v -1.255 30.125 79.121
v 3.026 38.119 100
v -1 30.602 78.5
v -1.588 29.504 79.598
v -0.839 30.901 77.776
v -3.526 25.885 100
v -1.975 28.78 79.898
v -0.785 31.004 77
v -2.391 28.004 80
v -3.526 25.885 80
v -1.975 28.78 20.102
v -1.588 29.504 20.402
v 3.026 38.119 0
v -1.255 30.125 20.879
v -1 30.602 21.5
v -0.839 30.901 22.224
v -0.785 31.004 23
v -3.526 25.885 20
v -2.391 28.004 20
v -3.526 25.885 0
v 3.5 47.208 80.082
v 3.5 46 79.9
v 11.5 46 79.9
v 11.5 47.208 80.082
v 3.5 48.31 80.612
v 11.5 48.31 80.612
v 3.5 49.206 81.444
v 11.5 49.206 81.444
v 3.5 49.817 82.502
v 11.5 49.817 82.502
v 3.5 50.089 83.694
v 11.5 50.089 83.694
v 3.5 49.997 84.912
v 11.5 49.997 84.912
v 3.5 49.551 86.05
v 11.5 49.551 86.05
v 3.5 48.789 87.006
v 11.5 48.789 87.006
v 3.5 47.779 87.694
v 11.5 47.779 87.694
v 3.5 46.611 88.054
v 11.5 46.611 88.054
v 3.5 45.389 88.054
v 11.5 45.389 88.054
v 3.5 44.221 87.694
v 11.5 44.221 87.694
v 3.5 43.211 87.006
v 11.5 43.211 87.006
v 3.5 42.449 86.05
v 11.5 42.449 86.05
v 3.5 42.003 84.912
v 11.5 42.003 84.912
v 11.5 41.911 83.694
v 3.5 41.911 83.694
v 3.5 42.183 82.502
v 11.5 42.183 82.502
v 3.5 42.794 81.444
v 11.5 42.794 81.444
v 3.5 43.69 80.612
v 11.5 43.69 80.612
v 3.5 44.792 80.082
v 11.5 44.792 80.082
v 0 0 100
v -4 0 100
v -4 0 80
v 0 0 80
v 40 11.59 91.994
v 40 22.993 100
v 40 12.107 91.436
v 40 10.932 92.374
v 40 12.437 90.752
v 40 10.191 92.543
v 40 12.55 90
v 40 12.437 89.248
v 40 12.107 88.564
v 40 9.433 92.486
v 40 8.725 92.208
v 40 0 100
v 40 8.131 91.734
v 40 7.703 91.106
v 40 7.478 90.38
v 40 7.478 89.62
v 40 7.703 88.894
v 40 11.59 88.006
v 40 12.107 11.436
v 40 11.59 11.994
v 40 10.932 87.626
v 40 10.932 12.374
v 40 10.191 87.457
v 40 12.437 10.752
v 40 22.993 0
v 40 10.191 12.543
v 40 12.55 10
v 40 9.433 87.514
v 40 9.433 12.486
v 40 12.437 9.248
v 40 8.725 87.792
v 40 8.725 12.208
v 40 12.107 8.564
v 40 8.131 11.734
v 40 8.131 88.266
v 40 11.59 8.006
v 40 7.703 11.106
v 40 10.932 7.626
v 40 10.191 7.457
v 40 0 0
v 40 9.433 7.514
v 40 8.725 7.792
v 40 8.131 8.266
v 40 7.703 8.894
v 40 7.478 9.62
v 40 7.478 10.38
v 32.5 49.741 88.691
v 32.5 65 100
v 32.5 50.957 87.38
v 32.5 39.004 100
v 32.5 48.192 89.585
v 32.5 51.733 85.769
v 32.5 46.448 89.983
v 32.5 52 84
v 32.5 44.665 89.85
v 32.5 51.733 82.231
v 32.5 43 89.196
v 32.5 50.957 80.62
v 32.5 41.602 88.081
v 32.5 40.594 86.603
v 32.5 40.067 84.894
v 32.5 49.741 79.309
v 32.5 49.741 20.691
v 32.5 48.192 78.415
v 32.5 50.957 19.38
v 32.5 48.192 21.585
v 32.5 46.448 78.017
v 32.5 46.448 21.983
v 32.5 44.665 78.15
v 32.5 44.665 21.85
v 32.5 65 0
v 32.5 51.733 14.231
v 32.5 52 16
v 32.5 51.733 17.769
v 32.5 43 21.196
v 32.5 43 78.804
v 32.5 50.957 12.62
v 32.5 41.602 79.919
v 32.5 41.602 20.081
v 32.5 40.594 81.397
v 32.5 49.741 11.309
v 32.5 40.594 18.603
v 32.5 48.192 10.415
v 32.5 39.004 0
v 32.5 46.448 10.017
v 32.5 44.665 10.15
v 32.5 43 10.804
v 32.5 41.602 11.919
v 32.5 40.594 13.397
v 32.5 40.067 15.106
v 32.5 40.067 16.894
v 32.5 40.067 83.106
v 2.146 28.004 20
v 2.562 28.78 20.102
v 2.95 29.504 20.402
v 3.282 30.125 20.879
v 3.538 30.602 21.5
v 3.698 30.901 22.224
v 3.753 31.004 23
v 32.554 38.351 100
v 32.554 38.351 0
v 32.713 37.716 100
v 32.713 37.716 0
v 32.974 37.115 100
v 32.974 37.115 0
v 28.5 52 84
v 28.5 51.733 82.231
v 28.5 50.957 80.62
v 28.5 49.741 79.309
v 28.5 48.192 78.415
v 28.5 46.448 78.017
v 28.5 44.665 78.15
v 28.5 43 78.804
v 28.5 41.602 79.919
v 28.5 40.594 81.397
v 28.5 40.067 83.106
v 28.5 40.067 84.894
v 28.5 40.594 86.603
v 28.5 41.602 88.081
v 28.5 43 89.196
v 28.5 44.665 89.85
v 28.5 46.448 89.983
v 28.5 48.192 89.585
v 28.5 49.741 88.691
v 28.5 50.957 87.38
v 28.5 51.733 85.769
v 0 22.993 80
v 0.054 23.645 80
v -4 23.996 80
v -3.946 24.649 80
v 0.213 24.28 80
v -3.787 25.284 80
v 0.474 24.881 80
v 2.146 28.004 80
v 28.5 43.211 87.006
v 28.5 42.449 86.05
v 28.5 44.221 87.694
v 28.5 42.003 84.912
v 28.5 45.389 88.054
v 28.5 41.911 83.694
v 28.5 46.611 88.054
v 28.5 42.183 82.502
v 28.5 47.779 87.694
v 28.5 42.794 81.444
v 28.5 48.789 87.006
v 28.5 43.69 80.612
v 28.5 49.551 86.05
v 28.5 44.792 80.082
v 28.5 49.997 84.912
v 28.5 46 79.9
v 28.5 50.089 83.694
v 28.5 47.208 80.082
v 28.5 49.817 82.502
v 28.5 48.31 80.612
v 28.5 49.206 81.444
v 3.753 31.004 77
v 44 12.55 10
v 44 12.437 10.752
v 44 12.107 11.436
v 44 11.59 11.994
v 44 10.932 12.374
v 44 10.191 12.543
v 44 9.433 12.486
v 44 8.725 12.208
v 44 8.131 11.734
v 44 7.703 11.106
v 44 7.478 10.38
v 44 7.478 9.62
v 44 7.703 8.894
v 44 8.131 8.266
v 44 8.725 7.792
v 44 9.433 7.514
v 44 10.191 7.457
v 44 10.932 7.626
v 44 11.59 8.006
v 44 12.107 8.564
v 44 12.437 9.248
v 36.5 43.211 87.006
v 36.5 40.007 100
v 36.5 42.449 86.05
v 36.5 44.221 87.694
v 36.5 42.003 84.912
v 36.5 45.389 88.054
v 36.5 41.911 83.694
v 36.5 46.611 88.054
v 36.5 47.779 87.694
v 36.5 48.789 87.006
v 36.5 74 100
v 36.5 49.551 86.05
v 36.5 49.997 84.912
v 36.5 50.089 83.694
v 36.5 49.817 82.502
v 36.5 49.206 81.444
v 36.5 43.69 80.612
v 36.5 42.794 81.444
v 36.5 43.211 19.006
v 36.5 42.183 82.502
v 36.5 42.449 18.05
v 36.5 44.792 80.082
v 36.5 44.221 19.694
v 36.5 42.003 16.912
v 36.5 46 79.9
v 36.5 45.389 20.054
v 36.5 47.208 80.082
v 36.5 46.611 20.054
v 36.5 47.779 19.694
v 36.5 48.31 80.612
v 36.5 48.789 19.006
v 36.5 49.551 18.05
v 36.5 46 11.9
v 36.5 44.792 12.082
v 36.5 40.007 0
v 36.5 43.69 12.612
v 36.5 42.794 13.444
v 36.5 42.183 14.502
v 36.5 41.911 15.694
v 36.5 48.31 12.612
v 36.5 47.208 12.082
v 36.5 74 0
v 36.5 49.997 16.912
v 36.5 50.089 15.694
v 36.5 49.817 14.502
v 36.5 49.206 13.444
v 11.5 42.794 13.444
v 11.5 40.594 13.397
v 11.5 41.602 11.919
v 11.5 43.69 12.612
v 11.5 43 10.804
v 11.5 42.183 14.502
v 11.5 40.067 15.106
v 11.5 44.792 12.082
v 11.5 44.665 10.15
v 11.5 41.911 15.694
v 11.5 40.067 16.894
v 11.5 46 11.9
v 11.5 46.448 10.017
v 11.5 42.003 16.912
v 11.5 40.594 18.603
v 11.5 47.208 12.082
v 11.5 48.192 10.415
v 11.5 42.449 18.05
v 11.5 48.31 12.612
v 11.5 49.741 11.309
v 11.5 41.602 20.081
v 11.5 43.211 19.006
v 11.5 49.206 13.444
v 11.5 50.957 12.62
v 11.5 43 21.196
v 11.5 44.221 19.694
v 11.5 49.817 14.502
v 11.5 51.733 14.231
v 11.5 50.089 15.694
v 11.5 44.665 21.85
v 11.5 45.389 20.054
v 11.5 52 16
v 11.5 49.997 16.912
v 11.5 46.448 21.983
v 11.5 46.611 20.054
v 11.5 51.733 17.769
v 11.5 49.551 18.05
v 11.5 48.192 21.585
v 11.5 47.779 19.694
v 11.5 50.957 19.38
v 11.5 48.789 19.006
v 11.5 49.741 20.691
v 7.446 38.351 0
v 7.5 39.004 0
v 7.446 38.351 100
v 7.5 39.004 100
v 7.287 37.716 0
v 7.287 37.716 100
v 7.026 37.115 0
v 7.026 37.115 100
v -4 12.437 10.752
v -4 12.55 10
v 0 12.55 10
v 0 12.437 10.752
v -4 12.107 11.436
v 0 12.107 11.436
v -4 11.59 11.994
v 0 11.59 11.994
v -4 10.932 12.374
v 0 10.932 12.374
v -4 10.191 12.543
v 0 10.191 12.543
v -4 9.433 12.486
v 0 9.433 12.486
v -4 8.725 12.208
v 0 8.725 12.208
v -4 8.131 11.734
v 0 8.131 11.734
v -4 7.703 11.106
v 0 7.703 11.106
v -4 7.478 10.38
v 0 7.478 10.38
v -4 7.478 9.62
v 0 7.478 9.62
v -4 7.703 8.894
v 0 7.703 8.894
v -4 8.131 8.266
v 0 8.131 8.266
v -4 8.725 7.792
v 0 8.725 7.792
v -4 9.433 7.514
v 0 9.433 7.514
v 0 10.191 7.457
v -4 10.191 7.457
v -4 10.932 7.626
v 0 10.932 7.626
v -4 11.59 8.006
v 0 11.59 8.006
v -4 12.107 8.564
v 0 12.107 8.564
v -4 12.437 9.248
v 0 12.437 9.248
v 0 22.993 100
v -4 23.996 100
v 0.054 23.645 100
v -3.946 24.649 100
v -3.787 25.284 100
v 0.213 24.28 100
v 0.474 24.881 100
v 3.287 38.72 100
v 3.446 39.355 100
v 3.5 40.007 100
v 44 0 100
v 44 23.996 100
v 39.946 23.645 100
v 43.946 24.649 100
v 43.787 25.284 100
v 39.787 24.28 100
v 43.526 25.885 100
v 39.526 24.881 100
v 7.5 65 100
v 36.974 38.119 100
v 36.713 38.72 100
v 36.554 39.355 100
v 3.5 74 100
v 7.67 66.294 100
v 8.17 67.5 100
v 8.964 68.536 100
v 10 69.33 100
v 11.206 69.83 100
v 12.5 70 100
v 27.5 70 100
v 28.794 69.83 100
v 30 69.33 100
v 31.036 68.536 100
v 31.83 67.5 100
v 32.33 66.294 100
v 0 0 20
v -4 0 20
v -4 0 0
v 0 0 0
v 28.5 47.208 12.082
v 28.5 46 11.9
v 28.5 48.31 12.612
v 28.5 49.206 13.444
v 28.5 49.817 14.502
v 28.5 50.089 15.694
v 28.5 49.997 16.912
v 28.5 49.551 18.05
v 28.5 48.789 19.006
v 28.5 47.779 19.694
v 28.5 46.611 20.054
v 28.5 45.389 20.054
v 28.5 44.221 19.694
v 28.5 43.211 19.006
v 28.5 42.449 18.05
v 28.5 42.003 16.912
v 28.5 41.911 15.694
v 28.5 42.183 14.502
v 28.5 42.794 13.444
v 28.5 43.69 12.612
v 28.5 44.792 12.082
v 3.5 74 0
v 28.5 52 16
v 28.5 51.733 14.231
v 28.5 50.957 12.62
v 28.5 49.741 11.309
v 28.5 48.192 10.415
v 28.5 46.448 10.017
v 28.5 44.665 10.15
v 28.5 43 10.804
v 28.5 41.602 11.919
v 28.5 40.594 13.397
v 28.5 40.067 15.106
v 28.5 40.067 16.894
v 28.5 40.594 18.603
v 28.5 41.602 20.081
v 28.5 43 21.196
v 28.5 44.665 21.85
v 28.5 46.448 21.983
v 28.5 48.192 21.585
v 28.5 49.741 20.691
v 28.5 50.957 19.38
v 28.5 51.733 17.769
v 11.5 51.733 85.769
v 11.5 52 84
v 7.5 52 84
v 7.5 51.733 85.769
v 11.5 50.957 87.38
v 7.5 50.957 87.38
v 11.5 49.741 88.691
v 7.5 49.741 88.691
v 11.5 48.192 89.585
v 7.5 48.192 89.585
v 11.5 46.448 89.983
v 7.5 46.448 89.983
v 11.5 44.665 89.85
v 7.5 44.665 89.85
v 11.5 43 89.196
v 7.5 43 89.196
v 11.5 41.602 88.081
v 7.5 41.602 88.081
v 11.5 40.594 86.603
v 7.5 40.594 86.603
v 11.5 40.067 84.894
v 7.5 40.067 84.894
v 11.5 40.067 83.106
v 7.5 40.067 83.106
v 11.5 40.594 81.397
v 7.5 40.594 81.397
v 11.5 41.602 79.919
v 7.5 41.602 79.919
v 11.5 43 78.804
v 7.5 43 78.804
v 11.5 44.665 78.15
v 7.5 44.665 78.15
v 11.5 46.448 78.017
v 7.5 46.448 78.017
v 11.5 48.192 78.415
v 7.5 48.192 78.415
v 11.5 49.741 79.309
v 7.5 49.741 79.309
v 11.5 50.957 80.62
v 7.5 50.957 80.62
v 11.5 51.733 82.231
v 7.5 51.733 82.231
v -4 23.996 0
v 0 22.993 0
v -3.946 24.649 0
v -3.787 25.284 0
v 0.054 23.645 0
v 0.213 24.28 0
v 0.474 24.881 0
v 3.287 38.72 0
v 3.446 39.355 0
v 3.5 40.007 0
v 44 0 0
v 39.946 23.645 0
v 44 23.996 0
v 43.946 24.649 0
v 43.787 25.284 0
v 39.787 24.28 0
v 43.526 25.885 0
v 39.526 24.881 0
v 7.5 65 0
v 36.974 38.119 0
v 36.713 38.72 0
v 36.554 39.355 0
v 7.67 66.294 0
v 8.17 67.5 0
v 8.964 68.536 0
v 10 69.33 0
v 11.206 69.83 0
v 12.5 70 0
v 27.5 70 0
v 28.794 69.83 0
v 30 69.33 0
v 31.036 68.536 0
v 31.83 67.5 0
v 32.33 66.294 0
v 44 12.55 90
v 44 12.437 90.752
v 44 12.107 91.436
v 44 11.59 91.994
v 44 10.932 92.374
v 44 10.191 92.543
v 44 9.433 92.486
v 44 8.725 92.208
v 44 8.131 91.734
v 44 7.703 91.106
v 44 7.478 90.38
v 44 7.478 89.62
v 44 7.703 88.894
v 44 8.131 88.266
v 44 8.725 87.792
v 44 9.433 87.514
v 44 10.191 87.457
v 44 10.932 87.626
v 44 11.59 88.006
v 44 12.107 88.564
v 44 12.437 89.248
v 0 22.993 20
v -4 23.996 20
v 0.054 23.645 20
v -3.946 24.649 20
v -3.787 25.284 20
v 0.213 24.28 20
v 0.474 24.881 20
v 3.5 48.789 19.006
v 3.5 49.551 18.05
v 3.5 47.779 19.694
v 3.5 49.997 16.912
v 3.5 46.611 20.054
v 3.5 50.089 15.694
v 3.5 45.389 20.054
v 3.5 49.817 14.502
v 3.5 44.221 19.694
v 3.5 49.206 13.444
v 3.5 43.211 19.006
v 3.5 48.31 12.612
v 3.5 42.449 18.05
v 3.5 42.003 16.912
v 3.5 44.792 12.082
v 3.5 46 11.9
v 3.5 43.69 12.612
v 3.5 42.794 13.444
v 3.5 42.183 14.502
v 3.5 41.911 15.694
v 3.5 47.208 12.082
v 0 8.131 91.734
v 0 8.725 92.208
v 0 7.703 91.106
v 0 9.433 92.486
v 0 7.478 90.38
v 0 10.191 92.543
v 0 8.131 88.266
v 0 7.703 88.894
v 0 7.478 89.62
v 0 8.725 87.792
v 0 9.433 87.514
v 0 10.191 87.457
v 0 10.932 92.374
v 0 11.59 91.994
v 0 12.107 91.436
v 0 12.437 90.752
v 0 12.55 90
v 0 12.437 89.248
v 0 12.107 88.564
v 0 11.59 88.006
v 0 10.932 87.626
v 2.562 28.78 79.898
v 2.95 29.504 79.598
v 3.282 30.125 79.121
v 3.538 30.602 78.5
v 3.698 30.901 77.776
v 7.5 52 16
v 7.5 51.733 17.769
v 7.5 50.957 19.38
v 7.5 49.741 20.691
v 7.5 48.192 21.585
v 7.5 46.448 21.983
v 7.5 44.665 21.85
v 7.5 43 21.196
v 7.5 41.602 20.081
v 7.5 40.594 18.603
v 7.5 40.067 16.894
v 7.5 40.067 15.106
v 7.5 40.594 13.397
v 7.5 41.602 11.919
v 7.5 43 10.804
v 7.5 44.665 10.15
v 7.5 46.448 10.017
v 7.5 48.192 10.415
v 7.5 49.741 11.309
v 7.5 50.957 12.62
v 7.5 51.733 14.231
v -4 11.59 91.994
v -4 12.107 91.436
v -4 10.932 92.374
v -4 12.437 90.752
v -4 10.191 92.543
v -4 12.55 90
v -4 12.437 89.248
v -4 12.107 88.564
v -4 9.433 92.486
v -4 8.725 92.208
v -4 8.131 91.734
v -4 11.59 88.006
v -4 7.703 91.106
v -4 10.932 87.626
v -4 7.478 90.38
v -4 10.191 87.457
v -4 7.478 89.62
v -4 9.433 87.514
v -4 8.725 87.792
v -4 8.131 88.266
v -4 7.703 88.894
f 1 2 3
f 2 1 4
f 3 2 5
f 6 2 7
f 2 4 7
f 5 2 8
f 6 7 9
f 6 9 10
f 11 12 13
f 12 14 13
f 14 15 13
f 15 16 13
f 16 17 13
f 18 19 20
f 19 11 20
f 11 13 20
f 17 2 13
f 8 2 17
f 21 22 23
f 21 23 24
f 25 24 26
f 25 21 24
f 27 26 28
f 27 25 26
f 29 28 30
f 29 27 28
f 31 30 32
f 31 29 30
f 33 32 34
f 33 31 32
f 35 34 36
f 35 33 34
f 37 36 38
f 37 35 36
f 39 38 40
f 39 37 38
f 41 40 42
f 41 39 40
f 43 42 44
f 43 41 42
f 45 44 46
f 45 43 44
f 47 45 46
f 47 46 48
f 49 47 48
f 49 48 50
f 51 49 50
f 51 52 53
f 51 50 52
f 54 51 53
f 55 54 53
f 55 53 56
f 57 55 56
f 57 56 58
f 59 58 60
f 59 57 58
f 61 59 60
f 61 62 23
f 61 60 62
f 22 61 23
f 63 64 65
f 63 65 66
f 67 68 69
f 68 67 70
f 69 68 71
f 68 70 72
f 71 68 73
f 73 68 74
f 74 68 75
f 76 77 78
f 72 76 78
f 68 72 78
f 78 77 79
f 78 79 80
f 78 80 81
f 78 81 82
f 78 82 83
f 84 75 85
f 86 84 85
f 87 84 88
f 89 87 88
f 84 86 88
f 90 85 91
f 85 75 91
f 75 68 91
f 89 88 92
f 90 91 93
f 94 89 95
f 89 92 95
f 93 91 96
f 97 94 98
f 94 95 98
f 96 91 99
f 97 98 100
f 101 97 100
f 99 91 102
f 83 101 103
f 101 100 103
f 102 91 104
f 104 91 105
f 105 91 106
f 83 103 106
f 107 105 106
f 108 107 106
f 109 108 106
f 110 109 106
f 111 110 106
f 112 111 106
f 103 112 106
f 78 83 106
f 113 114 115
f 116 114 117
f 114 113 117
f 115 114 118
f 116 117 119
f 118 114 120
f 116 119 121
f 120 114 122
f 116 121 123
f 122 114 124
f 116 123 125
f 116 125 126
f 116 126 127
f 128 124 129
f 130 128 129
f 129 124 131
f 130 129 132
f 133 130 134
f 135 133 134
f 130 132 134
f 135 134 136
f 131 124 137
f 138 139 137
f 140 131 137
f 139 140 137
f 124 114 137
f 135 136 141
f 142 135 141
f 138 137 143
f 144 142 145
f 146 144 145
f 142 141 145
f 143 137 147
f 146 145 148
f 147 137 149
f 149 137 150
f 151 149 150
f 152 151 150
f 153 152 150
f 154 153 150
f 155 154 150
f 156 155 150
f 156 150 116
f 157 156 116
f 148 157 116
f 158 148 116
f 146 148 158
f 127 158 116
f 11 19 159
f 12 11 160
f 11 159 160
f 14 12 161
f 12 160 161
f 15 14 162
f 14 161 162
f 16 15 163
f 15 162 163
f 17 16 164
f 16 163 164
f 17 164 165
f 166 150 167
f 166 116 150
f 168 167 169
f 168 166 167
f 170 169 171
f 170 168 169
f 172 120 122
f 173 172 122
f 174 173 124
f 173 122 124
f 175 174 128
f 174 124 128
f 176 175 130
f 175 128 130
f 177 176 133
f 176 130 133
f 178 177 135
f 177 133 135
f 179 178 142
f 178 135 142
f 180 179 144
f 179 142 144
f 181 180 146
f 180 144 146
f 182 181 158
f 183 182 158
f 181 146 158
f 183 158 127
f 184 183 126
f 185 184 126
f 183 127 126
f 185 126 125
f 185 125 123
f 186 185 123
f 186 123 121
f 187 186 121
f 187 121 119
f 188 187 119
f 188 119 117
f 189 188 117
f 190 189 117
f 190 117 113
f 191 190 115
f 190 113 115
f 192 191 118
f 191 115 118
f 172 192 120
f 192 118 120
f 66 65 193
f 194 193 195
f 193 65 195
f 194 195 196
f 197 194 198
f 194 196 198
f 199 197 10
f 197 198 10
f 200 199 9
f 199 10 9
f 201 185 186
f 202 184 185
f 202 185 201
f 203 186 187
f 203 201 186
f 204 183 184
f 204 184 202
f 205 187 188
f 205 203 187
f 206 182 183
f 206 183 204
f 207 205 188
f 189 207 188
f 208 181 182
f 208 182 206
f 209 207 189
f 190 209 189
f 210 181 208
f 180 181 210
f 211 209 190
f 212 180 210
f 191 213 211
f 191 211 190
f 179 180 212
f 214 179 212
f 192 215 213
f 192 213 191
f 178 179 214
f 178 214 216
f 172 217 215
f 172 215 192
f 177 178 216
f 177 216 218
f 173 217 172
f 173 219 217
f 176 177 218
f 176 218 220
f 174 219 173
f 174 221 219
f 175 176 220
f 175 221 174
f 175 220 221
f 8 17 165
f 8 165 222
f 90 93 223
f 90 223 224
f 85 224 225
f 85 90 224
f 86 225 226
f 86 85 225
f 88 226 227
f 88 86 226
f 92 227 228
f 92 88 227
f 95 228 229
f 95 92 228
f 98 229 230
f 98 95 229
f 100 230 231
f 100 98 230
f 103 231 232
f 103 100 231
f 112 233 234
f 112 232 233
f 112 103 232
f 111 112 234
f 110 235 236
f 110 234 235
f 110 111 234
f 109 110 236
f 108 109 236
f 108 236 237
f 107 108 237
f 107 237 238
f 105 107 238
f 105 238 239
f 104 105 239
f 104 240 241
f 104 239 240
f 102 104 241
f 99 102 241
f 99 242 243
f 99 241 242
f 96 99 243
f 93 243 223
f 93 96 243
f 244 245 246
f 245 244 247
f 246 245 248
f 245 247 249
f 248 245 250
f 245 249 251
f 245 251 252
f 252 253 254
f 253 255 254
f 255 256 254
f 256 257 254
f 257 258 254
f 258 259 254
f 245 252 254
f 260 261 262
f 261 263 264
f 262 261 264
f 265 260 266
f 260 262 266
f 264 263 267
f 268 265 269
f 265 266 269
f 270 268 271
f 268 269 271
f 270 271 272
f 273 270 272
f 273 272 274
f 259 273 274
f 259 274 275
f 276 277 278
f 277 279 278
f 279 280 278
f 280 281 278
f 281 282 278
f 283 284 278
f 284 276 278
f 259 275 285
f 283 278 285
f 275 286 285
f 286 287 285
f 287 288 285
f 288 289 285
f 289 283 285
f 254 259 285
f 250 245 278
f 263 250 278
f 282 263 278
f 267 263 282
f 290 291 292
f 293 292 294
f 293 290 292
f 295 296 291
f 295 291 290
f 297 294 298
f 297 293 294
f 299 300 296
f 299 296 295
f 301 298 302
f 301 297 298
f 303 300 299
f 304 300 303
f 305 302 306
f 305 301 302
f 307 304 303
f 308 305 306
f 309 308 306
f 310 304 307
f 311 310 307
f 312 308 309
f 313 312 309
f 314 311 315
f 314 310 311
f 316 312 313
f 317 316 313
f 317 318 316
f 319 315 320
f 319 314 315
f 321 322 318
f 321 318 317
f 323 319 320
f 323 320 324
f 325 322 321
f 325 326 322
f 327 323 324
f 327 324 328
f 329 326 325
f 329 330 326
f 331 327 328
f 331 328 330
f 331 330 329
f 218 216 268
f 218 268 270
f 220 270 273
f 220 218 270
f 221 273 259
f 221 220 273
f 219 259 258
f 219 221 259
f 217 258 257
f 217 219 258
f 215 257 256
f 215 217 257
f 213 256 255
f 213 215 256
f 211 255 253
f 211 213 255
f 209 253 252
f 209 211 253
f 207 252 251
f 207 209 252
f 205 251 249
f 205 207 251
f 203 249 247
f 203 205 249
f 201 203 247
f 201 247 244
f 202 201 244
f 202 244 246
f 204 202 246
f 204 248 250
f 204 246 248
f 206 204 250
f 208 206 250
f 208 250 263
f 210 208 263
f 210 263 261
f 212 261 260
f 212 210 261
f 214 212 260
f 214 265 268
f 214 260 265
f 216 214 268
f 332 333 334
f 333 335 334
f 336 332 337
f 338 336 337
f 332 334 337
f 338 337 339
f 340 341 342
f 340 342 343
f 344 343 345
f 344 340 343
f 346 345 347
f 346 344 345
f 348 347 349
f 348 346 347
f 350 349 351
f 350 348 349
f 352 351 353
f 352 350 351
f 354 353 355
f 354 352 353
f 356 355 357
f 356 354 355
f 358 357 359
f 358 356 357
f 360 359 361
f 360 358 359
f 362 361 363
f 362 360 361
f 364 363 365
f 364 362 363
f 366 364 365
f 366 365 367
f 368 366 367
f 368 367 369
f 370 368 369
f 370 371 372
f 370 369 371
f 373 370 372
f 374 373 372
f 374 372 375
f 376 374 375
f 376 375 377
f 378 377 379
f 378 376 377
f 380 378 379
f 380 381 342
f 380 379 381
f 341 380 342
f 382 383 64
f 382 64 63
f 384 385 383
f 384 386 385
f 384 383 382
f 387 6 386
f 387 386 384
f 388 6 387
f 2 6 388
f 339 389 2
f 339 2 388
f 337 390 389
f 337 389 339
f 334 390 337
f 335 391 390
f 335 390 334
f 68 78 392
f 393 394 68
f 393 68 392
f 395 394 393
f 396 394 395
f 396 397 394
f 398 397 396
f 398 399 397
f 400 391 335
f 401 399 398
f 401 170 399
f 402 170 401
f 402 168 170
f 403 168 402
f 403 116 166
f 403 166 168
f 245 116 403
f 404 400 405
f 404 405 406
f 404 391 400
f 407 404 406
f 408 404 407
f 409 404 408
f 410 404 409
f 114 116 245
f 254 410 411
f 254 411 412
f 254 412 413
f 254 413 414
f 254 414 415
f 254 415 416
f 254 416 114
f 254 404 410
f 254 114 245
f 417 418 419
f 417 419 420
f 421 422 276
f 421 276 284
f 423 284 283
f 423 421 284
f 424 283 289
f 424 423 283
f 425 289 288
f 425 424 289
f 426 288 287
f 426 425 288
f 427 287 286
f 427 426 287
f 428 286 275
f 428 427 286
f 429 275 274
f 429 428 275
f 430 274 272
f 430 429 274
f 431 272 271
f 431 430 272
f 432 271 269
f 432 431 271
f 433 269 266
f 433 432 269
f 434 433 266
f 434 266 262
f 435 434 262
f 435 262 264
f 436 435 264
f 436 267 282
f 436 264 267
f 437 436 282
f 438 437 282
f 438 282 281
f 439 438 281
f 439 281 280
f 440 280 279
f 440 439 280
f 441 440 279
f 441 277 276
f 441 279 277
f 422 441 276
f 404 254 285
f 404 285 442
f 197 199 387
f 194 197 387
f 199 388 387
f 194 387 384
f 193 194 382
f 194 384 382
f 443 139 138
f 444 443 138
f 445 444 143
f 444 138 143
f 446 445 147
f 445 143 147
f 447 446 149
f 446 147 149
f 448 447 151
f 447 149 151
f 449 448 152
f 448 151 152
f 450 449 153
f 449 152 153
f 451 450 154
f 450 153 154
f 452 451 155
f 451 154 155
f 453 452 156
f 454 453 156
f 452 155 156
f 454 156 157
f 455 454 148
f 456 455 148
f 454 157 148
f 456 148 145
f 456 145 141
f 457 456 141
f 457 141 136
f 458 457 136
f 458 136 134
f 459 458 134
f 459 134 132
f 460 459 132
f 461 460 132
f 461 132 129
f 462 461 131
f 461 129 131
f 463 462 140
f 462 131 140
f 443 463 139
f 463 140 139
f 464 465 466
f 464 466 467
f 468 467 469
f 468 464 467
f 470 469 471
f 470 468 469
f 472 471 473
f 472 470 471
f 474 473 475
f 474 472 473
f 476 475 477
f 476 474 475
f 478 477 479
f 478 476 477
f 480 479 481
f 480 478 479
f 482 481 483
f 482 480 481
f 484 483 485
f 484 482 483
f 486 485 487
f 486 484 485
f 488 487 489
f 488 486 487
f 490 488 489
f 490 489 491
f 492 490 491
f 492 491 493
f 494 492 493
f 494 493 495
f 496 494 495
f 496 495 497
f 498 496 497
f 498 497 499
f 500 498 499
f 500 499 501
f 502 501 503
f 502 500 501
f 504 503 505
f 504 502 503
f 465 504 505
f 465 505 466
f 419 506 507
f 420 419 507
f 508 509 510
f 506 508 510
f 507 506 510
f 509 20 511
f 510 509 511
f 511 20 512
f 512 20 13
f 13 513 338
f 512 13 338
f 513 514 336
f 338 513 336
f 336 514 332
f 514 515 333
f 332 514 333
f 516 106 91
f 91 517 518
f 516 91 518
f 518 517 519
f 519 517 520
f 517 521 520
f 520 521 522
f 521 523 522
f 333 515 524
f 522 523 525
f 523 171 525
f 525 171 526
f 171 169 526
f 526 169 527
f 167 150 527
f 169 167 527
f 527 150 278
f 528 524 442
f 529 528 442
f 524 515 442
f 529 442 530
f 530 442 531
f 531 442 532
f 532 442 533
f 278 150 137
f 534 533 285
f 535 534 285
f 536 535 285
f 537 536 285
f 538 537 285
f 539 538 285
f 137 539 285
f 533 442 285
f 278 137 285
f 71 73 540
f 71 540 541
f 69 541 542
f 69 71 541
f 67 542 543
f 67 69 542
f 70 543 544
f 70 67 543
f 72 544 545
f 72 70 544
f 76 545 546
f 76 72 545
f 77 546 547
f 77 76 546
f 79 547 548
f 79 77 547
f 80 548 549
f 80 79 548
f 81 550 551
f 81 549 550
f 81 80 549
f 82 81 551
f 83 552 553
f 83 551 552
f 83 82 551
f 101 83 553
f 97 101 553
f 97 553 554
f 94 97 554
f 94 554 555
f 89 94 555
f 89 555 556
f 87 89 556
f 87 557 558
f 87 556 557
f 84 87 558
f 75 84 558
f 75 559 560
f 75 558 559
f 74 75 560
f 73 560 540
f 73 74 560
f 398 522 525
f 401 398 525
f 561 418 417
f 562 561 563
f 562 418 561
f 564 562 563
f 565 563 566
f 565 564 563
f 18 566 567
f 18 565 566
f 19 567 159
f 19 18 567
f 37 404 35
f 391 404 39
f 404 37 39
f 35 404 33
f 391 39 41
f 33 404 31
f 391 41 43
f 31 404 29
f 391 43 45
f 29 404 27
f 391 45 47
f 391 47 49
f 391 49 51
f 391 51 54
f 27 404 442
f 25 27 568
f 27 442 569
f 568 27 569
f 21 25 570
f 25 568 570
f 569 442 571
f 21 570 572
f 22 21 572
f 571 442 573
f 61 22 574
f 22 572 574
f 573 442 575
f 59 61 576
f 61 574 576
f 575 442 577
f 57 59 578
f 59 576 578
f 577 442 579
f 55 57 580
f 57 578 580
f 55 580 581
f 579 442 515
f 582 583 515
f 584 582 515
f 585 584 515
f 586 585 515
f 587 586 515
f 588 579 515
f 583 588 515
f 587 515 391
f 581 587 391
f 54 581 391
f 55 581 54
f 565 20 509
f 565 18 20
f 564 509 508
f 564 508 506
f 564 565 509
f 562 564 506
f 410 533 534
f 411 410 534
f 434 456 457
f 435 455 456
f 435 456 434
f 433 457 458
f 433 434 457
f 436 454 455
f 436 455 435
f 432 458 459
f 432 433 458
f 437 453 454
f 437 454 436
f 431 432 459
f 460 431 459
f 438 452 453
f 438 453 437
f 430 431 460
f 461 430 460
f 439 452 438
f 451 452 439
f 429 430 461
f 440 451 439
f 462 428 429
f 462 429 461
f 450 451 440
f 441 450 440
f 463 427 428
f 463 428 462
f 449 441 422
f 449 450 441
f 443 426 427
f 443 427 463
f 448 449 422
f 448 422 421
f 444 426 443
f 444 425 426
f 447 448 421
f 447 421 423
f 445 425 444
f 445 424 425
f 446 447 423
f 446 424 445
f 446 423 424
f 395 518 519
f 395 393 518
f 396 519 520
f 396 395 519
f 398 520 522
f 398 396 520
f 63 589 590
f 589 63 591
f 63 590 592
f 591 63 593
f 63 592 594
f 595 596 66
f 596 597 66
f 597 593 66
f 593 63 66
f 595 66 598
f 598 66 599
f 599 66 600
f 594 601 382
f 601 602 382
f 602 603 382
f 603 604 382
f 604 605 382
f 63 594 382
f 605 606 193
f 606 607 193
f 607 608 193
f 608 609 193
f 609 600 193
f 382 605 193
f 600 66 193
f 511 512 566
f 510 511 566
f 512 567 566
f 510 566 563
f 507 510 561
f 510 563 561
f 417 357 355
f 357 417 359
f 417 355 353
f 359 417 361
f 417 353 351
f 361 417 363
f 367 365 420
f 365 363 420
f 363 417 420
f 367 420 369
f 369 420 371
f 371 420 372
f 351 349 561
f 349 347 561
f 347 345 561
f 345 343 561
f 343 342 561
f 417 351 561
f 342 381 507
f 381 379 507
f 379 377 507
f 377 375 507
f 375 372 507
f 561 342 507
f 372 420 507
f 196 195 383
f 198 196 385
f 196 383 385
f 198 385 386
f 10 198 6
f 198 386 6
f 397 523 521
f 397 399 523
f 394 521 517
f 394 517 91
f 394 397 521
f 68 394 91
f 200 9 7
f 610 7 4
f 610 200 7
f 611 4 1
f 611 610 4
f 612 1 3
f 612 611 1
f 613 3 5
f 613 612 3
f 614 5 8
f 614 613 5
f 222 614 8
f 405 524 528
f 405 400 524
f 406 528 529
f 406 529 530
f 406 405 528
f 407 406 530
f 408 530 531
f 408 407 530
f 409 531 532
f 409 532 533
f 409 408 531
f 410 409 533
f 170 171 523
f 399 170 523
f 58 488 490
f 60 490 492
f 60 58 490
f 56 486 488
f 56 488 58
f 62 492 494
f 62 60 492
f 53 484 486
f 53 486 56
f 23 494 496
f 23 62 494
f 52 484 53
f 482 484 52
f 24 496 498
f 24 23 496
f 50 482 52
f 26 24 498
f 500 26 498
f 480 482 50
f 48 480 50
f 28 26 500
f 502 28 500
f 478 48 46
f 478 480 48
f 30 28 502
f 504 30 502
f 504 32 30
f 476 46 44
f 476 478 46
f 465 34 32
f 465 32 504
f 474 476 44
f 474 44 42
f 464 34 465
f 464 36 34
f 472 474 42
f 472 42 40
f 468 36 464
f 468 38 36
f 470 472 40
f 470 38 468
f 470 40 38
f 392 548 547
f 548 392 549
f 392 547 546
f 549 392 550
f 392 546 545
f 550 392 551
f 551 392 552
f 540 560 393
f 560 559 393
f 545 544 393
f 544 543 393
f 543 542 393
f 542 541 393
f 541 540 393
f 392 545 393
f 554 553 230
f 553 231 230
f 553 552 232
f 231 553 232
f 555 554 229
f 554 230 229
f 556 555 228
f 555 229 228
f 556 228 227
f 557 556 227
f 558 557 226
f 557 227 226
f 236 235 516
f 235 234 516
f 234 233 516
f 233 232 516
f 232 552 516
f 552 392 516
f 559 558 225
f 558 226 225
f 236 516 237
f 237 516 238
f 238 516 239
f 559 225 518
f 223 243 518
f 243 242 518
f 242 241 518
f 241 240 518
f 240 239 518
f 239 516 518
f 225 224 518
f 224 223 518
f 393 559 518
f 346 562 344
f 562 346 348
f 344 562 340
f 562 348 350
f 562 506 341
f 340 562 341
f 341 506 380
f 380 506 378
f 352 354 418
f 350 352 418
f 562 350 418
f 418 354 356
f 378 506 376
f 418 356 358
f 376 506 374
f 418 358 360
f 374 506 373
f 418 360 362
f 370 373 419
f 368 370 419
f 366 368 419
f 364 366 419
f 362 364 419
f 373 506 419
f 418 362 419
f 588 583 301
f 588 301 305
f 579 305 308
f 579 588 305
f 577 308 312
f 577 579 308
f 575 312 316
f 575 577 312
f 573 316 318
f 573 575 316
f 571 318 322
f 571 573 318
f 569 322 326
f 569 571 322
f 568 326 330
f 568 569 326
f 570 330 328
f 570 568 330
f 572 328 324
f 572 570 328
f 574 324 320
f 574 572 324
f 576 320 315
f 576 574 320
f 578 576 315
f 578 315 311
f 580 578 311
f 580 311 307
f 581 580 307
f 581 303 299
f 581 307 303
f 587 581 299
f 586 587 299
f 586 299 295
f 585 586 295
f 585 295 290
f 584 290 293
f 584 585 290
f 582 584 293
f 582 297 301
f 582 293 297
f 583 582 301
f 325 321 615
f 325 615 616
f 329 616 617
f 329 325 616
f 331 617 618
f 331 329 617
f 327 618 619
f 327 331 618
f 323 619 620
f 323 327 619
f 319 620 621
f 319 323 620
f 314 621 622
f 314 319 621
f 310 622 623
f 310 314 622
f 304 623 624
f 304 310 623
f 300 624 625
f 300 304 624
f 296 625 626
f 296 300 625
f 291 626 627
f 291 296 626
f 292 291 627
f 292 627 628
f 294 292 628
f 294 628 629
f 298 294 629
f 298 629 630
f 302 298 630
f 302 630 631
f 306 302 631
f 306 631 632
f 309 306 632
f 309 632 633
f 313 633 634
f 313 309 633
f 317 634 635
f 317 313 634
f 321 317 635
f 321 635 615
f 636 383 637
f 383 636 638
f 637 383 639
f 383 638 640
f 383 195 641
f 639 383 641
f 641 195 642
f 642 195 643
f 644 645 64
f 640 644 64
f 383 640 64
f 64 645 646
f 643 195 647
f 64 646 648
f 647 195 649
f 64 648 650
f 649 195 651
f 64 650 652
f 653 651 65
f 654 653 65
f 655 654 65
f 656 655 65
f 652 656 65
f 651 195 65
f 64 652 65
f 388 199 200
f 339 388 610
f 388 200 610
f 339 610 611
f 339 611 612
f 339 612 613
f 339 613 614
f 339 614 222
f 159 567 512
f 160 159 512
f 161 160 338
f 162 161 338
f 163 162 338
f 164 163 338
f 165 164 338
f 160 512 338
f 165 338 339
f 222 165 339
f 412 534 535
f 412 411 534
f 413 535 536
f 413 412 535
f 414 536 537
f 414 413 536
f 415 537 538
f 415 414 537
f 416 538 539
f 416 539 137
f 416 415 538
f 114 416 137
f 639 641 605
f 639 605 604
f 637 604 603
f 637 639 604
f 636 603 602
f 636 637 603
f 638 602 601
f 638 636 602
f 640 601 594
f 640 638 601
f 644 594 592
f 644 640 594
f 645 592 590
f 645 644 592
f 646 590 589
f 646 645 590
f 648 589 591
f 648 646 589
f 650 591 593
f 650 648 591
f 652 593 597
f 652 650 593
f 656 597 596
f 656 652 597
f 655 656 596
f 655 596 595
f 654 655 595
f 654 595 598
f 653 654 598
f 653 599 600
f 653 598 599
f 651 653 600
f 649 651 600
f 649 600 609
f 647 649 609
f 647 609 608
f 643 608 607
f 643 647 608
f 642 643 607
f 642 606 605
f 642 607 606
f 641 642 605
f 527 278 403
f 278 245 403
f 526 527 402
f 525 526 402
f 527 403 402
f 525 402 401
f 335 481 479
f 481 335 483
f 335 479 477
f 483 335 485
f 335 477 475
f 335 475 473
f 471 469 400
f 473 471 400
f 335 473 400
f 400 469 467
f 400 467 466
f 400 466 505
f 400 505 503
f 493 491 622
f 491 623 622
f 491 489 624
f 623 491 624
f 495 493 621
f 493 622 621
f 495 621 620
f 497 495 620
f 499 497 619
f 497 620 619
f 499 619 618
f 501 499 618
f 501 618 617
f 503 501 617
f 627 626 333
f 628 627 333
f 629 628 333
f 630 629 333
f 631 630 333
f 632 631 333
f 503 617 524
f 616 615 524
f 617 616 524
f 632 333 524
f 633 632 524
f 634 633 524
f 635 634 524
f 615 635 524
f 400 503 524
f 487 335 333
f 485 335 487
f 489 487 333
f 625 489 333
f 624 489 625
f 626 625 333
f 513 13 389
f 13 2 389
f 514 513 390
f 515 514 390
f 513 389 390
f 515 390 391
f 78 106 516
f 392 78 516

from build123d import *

# Parameters (mm, degrees)
BOSS_EXTRUDE1_DEPTH     = 100
SKETCH3_R               = 6
BOSS_EXTRUDE2_DEPTH     = 4
BOSS_EXTRUDE3_START     = 4
SKETCH4_R               = 6
BOSS_EXTRUDE3_DEPTH     = 4
CUT_EXTRUDE1_DEPTH      = 130.646635128
CUT_EXTRUDE1_DEPTH_BACK = 130.646635128
SKETCH9_R               = 4.1
CUT_EXTRUDE2_DEPTH      = 134.341666406
CUT_EXTRUDE2_DEPTH_BACK = 134.341666406
SKETCH10_R              = 2.55
SKETCH13_W              = 60
SKETCH13_H              = 31.00370213
CUT_EXTRUDE5_DEPTH      = 24
FILLET1_R               = 3
FILLET2_R               = 5
FILLET3_R               = 4


with BuildPart() as part:
    # Sketch2 → Boss-Extrude1 (new body)
    with BuildSketch(Plane.XY):
        Polygon((0, 0), (0, 23.99629787), (7.5, 38), (7.5, 70), (32.5, 70), (32.5, 38), (40, 23.99629787), (40, 0), (44, 0), (44, 25), (36.5, 39.00370213), (36.5, 74), (3.5, 74), (3.5, 39.00370213), (-4, 25), (-4, 0), align=None)
    extrude(amount=BOSS_EXTRUDE1_DEPTH)

    # Sketch3 → Boss-Extrude2 (add)
    with BuildSketch(Plane.ZY.offset(-32.5)):
        with Locations(Location((84, 46, 0), (0, 0, 90))):
            Circle(SKETCH3_R)
        with Locations(Location((16, 46, 0), (0, 0, 90))):
            Circle(SKETCH3_R)
    extrude(amount=BOSS_EXTRUDE2_DEPTH)

    # Sketch4 → Boss-Extrude3 (add)
    with BuildSketch(Plane(origin=(7.5, 0, 0), x_dir=(0, 0, -1), z_dir=(1, 0, 0)).offset(BOSS_EXTRUDE3_START)):
        with Locations(Location((-16, 46, 0), (0, 0, 90))):
            Circle(SKETCH4_R)
        with Locations(Location((-84, 46, 0), (0, 0, 90))):
            Circle(SKETCH4_R)
    extrude(amount=-BOSS_EXTRUDE3_DEPTH)

    # Sketch9 → Cut-Extrude1 (cut, two sides: drawn at the far end of the back side and taken through both)
    with BuildSketch(Plane(origin=(7.5, 0, 0), x_dir=(0, 0, -1), z_dir=(1, 0, 0)).offset(-CUT_EXTRUDE1_DEPTH_BACK)):
        with Locations((-16, 46)):
            Circle(SKETCH9_R)
        with Locations((-84, 46)):
            Circle(SKETCH9_R)
    extrude(amount=CUT_EXTRUDE1_DEPTH + CUT_EXTRUDE1_DEPTH_BACK, mode=Mode.SUBTRACT)

    # Sketch10 → Cut-Extrude2 (cut, two sides: drawn at the far end of the back side and taken through both)
    with BuildSketch(Plane(origin=(44, 0, 0), x_dir=(0, 0, -1), z_dir=(1, 0, 0)).offset(-CUT_EXTRUDE2_DEPTH_BACK)):
        with Locations(Location((-10, 10, 0), (0, 0, 90))):
            Circle(SKETCH10_R)
        with Locations(Location((-90, 10, 0), (0, 0, 90))):
            Circle(SKETCH10_R)
    extrude(amount=CUT_EXTRUDE2_DEPTH + CUT_EXTRUDE2_DEPTH_BACK, mode=Mode.SUBTRACT)

    # Sketch13 → Cut-Extrude5 (cut)
    with BuildSketch(Plane.ZY.offset(4)):
        with Locations((50, 15.501851065)):
            Rectangle(SKETCH13_W, SKETCH13_H)
    extrude(amount=-CUT_EXTRUDE5_DEPTH, mode=Mode.SUBTRACT)

    # Fillet1
    fillet1_edges = [part.edges().sort_by_distance(p)[0] for p in [
        (1.48419643, 31.00370213, 20),
        (1.48419643, 31.00370213, 80),
    ]]
    fillet(fillet1_edges, radius=FILLET1_R)

    # Fillet2
    fillet2_edges = [part.edges().sort_by_distance(p)[0] for p in [
        (32.5, 70, 50),
        (7.5, 70, 50),
    ]]
    fillet(fillet2_edges, radius=FILLET2_R)

    # Fillet3
    fillet3_edges = [part.edges().sort_by_distance(p)[0] for p in [
        (-4, 25, 10),
        (0, 23.99629787, 10),
        (-4, 25, 90),
        (3.5, 39.00370213, 50),
        (36.5, 39.00370213, 50),
        (44, 25, 50),
        (40, 23.99629787, 50),
        (32.5, 38, 50),
        (7.5, 38, 50),
        (0, 23.99629787, 90),
    ]]
    fillet(fillet3_edges, radius=FILLET3_R)


solid = part.part
